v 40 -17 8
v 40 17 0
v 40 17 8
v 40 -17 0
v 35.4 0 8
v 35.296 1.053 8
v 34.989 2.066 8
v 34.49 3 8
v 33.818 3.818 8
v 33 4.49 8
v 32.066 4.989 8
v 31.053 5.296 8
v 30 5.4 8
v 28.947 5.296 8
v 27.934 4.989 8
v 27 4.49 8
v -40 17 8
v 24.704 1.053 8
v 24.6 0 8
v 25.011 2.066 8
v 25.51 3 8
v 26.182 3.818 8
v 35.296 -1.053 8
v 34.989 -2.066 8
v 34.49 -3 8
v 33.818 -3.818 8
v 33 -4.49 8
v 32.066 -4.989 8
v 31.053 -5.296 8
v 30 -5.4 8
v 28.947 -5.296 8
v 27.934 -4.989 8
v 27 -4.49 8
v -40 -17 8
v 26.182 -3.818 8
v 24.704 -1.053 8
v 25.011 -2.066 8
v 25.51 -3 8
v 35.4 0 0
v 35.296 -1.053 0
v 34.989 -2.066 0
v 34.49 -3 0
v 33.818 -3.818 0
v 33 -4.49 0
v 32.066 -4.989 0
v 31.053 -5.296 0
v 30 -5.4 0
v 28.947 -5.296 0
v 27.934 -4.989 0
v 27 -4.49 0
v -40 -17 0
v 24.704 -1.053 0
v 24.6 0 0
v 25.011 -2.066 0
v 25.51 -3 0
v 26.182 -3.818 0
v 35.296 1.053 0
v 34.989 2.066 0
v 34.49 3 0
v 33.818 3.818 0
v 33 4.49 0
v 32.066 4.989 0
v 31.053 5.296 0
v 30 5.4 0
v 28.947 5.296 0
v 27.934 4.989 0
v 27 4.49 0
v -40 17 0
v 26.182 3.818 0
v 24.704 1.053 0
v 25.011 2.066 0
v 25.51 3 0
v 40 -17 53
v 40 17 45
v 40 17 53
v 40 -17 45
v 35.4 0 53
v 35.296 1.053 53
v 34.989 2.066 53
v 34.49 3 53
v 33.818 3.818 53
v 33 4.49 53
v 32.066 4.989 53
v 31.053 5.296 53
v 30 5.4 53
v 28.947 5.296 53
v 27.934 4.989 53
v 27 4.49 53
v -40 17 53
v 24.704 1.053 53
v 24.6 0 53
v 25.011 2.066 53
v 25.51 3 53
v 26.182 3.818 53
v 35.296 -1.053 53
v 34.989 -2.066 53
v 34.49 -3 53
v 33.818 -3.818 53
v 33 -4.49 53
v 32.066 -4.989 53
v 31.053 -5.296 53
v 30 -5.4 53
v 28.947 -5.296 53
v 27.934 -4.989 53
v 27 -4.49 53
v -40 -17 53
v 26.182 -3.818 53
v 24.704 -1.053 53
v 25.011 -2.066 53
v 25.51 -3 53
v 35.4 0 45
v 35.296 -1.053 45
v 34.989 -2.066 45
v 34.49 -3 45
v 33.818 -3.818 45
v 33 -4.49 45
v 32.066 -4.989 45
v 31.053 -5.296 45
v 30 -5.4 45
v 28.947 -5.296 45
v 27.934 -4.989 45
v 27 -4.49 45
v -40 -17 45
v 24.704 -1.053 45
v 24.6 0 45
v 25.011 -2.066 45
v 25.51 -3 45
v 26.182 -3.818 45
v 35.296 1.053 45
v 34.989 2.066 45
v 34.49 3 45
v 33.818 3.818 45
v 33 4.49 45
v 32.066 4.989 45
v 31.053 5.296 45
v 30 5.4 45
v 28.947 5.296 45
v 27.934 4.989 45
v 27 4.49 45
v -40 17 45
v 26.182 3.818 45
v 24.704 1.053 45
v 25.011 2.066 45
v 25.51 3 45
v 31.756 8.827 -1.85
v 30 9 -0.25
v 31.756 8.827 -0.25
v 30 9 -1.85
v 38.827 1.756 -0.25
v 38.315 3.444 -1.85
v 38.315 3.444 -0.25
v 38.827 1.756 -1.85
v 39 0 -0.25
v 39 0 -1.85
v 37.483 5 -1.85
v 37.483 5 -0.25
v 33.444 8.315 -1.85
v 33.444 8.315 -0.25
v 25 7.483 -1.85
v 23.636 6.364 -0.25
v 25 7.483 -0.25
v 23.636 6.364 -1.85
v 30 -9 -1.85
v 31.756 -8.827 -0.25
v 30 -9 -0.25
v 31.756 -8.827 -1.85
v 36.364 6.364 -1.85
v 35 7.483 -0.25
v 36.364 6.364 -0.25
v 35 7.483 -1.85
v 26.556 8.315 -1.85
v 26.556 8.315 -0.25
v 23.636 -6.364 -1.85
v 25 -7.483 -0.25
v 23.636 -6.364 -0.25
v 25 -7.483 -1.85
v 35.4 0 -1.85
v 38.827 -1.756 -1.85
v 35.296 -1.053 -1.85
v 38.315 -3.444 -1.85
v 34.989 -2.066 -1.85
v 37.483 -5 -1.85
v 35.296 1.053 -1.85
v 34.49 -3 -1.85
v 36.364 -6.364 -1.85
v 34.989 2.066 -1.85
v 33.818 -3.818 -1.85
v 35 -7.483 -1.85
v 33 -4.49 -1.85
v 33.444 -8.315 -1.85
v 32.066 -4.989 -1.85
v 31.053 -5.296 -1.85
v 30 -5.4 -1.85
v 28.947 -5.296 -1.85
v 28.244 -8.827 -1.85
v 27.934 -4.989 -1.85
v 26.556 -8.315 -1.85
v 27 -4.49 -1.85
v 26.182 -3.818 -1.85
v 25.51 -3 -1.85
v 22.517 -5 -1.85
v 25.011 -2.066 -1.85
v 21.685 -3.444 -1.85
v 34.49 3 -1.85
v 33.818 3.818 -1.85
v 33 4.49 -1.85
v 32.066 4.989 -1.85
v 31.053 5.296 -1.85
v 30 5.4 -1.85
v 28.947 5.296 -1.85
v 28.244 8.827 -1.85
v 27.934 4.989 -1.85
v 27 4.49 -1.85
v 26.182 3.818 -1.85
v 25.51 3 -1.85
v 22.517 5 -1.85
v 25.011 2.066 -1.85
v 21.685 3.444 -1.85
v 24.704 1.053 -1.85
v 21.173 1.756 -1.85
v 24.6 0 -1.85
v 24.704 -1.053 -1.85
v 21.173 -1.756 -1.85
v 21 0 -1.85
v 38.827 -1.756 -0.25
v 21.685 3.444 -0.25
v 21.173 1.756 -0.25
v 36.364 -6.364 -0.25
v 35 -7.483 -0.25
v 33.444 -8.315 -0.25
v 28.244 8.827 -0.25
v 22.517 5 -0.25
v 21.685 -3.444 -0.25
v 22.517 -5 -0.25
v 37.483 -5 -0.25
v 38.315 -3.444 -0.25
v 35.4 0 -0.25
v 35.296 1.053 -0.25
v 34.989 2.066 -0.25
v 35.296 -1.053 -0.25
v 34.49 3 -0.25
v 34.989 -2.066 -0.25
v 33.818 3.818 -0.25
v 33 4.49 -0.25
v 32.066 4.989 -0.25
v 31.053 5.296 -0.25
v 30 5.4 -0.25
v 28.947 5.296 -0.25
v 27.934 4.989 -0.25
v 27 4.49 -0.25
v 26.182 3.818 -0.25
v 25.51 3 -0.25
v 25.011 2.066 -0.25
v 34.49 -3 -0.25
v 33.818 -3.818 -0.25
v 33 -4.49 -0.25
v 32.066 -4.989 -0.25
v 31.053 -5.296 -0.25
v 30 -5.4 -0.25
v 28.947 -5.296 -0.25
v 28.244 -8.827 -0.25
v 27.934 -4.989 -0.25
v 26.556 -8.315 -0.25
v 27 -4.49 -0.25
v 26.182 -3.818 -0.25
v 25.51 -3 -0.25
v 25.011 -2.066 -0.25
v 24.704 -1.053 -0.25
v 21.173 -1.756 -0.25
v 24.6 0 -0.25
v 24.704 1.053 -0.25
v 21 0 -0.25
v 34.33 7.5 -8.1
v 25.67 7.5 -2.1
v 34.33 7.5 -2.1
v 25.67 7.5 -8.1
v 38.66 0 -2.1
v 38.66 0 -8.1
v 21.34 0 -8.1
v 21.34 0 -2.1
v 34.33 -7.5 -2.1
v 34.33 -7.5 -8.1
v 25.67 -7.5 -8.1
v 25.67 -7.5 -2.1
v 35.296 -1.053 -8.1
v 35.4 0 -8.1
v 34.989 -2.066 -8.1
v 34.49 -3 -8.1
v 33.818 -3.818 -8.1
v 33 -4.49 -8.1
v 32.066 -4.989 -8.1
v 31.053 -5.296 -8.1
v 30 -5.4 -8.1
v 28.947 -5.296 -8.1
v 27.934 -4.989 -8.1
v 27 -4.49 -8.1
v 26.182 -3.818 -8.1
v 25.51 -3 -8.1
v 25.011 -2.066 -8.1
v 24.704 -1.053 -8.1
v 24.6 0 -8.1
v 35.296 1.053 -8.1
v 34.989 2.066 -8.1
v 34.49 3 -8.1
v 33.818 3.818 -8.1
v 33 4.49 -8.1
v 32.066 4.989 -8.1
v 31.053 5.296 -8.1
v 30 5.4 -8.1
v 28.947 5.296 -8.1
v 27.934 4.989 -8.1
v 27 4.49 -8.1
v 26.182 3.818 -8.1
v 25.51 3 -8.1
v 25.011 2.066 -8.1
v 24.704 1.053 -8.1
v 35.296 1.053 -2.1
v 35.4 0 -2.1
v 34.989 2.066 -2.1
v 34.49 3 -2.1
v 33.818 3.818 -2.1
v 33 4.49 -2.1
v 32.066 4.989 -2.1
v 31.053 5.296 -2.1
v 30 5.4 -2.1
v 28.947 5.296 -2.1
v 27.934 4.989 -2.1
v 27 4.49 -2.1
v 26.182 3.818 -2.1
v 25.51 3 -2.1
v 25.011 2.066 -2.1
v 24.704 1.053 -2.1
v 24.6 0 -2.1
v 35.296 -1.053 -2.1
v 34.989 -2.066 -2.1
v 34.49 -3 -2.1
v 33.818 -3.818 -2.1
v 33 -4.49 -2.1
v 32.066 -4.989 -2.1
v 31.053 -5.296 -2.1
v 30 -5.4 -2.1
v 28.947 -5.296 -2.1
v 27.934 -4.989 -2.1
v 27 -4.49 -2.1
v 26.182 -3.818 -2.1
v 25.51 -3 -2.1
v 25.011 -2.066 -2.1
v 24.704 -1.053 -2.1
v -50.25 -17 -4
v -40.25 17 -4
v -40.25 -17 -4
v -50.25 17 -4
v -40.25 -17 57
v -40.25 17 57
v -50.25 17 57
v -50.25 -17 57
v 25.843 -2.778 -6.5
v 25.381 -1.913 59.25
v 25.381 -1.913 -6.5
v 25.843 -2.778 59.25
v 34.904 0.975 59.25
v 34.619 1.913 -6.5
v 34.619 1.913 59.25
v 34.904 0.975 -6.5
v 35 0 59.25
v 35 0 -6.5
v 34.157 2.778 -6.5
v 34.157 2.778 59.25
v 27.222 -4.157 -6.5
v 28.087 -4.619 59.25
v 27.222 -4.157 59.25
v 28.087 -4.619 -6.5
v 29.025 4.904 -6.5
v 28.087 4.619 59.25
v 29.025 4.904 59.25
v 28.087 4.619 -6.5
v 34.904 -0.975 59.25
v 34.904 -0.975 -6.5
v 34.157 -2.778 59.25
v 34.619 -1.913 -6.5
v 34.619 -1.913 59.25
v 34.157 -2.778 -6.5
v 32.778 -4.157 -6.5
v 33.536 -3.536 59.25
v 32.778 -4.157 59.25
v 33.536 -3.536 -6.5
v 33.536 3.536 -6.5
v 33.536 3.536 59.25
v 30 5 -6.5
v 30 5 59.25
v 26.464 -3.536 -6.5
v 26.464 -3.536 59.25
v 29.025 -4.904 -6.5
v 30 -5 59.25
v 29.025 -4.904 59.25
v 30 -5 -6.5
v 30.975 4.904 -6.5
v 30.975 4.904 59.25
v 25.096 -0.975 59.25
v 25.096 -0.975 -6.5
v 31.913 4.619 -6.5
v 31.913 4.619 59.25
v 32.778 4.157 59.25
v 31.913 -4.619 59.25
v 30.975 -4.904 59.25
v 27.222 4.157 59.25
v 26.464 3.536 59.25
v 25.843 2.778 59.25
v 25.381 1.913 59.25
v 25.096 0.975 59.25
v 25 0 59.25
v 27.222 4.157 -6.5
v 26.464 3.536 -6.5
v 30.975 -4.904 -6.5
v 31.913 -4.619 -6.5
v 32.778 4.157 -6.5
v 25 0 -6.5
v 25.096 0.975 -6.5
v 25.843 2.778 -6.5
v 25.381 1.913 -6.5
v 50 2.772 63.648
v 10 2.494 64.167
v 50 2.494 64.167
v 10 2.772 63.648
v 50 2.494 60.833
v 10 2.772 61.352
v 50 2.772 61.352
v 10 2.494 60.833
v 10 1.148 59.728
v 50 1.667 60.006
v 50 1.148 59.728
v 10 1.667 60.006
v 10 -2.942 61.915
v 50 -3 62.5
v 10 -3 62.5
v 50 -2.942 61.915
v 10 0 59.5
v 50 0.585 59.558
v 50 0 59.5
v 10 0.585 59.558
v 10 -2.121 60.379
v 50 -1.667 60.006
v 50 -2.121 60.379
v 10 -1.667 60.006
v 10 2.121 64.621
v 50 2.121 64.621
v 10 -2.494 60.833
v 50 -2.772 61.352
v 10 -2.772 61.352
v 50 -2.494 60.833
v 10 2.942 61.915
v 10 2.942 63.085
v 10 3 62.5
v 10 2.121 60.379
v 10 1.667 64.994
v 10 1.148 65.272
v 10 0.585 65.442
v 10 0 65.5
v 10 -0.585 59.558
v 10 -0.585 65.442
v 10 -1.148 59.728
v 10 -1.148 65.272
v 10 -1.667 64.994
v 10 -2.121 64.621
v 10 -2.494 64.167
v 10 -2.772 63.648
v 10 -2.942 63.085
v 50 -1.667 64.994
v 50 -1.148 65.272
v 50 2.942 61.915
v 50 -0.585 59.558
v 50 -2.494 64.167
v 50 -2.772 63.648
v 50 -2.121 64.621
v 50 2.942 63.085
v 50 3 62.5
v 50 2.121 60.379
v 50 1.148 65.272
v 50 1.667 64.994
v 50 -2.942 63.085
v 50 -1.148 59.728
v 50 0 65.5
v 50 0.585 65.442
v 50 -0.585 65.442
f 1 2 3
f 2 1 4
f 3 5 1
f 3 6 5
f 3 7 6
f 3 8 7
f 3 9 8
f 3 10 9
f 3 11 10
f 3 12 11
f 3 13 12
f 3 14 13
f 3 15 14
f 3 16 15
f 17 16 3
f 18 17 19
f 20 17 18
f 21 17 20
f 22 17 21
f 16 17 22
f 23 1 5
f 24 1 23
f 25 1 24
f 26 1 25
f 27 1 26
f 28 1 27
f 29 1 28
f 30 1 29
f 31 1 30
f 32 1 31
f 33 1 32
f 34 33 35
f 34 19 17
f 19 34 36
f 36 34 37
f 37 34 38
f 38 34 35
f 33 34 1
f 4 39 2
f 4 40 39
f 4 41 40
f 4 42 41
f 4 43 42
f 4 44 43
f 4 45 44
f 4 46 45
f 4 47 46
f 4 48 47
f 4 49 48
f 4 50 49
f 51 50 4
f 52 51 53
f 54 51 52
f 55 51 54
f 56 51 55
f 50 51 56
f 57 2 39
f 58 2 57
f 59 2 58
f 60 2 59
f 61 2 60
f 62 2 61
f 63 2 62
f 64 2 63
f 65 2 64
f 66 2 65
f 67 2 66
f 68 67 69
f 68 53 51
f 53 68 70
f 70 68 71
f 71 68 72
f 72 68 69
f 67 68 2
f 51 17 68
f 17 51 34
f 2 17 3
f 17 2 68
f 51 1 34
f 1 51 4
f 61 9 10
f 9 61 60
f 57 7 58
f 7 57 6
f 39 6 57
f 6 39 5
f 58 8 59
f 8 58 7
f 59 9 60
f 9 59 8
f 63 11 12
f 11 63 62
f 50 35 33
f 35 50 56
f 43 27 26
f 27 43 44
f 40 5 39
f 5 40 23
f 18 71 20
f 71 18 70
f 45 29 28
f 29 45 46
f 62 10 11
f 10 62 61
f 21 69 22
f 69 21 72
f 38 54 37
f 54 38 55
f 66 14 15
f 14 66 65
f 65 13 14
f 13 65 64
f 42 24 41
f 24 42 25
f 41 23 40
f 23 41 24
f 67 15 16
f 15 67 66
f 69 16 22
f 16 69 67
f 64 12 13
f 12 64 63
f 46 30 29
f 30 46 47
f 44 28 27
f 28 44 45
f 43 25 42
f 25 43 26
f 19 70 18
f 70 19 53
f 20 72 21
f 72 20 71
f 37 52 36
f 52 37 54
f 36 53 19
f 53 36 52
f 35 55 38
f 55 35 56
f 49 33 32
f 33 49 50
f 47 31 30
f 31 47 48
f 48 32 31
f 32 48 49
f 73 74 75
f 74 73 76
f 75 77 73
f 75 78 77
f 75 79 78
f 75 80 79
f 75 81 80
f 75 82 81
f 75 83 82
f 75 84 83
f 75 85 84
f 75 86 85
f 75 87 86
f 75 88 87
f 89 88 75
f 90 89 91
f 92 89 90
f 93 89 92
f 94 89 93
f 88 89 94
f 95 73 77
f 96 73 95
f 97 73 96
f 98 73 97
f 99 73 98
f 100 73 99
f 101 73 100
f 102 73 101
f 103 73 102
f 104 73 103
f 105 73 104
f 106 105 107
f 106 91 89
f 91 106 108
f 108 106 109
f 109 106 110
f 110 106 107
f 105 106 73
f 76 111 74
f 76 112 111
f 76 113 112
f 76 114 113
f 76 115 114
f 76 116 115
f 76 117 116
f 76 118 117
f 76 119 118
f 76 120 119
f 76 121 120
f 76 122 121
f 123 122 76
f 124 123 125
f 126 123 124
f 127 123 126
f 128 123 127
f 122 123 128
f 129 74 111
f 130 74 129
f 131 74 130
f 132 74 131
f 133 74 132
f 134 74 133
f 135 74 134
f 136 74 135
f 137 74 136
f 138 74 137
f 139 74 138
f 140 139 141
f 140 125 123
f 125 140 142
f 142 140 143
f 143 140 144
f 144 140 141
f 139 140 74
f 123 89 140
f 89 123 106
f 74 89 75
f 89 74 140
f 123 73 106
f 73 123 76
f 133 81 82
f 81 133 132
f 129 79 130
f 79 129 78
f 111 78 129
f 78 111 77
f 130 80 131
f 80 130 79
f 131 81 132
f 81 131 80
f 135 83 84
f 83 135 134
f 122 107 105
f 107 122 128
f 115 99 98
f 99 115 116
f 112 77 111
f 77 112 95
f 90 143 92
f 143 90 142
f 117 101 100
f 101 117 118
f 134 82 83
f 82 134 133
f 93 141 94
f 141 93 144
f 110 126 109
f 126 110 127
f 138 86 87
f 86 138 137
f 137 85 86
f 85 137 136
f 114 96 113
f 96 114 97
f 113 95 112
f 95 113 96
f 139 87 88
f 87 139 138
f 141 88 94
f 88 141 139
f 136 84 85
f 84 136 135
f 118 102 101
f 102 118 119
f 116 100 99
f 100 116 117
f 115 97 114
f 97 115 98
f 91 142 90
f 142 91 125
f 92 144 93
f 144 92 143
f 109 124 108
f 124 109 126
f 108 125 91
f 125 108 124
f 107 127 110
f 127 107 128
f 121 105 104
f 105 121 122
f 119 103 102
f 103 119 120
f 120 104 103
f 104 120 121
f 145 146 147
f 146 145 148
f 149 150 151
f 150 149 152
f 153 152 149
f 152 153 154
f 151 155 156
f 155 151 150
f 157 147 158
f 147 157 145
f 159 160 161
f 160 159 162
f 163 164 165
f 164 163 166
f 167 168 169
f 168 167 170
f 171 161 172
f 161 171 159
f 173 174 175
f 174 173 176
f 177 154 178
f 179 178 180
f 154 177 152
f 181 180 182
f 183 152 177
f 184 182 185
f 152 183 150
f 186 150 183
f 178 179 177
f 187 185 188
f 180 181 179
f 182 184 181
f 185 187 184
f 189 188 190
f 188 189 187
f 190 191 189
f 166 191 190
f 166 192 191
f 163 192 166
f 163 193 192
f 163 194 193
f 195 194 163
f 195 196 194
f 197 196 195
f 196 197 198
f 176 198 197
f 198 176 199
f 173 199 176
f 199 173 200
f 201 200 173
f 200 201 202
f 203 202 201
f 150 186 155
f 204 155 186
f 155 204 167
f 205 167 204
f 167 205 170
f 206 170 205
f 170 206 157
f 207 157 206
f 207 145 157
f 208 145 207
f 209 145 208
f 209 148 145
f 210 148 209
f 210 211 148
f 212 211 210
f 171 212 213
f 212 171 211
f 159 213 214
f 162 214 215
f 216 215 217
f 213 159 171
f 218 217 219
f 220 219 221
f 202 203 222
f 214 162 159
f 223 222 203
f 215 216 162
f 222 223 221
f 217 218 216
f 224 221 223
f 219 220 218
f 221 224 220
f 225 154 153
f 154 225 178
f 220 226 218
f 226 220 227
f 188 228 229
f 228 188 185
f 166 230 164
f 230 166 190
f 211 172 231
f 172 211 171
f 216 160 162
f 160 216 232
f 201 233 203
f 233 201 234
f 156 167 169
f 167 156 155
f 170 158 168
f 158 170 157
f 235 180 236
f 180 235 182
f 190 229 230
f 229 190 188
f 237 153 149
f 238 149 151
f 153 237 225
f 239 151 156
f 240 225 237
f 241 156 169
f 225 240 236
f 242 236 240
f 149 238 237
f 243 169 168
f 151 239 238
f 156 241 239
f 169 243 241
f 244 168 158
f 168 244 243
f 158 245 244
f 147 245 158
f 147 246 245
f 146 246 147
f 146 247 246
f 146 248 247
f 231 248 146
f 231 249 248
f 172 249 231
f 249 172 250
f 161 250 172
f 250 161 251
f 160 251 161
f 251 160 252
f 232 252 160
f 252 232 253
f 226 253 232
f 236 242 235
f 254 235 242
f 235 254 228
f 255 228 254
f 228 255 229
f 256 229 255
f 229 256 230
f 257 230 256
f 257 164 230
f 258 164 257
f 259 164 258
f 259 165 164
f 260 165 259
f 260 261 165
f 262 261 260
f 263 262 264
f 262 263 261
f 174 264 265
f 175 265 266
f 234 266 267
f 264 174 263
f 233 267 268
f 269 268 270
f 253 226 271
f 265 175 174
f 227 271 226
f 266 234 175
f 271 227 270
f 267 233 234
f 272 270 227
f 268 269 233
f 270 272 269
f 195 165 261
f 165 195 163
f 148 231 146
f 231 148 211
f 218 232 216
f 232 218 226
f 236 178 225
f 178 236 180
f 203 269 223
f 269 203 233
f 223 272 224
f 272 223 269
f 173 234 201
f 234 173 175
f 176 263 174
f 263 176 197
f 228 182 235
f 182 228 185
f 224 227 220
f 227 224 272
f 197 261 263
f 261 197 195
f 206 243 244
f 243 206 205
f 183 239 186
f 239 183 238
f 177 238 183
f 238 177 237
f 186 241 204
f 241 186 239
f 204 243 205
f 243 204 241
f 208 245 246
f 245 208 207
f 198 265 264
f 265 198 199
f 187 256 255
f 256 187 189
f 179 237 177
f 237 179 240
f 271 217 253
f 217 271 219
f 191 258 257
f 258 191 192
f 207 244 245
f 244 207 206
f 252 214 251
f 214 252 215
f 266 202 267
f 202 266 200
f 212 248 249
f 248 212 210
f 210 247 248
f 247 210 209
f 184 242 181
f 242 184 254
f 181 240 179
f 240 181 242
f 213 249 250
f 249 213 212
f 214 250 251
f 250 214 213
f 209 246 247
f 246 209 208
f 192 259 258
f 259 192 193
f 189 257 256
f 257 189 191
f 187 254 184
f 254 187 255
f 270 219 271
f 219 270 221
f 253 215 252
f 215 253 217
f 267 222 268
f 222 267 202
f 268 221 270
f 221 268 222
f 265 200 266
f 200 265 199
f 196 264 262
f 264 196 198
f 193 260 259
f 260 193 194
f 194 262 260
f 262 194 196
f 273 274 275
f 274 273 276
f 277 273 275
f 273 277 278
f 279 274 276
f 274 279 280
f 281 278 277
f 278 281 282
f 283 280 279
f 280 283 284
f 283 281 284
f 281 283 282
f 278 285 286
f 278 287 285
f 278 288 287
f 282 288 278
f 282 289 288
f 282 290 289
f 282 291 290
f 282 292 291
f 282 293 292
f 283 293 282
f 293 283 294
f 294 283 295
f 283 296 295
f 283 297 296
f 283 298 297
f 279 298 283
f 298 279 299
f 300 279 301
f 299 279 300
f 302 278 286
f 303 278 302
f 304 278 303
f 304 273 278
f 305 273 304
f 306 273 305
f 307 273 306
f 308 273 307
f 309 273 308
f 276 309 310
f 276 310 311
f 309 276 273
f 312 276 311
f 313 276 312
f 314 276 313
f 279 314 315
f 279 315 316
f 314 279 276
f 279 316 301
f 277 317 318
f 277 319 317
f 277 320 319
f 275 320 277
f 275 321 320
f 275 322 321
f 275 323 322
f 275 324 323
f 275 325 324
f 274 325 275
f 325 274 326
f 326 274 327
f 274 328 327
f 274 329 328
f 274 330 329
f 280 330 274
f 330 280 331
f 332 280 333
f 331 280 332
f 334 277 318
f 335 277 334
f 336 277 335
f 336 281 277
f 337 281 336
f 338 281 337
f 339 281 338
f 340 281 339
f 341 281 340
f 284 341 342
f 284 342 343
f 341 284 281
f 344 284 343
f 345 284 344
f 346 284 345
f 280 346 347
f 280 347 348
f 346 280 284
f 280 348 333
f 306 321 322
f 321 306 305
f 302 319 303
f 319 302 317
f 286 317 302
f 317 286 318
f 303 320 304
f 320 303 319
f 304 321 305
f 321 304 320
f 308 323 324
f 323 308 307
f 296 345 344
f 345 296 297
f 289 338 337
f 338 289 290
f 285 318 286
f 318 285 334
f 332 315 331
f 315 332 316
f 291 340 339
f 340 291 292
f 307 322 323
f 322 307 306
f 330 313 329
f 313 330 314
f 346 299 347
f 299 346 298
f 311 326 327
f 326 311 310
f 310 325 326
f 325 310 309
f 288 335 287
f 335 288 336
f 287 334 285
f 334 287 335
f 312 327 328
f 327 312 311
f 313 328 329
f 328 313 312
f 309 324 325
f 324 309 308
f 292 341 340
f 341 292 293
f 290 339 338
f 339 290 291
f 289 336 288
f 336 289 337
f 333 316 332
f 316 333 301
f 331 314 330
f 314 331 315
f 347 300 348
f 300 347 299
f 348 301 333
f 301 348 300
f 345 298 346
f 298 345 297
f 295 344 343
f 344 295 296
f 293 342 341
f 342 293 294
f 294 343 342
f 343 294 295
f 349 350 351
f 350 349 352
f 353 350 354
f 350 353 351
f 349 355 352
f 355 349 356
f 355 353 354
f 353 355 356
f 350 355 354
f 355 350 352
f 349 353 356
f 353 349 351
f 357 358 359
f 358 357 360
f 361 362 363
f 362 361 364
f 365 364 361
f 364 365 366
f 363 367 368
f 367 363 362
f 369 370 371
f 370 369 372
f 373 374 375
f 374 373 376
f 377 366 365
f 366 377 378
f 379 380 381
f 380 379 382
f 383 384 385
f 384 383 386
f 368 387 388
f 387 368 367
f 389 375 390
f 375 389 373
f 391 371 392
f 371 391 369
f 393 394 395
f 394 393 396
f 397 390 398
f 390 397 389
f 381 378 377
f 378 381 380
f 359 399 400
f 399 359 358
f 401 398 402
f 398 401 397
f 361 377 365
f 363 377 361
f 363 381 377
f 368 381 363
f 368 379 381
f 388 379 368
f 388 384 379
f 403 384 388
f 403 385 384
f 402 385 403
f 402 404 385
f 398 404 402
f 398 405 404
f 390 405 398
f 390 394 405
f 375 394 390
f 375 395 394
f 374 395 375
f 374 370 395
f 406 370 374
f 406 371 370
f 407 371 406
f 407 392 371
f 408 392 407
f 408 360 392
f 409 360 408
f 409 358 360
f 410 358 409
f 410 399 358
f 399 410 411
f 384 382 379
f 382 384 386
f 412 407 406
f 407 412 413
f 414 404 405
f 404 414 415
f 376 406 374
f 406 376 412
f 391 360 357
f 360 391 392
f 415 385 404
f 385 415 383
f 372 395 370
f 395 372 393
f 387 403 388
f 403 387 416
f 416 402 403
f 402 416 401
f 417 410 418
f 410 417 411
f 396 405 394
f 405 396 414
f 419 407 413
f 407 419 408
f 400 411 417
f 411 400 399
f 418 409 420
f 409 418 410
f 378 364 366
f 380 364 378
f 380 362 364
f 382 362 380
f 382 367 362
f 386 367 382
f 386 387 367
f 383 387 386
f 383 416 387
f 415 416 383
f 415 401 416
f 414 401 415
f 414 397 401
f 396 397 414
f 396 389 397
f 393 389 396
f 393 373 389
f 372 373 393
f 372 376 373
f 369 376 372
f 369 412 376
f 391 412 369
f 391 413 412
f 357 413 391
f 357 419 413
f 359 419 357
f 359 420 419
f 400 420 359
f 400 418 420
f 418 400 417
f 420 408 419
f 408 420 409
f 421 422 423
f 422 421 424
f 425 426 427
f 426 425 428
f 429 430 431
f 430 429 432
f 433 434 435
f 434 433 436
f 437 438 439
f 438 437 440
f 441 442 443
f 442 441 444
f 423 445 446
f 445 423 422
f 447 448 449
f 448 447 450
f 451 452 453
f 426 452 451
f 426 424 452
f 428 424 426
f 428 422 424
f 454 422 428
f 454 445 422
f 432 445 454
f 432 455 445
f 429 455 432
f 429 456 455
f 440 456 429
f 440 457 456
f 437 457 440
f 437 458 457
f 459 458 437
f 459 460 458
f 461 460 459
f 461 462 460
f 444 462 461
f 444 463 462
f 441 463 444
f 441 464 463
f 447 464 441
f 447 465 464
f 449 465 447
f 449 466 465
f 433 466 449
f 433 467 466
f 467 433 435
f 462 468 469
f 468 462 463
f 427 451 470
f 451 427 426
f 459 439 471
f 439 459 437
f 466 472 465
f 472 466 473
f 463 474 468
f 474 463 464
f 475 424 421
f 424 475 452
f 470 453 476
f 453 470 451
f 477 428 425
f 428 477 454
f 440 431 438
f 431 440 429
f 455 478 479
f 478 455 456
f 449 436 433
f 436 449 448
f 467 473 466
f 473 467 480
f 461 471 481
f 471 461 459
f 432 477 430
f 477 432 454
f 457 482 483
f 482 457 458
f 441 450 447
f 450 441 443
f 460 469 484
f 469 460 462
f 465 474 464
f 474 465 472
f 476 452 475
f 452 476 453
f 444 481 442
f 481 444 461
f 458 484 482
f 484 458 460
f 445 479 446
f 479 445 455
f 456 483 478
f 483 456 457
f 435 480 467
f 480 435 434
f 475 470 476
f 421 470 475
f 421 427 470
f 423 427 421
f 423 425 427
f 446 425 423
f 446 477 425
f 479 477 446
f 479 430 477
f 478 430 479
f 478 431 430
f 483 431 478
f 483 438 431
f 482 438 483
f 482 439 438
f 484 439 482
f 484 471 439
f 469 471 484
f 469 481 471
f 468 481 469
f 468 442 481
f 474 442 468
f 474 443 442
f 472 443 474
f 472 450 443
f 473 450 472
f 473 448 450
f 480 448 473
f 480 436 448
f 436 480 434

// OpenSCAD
$fn = 32;

// ------------------------------------------------------------------------
// C clamp: throat 45 mm, screw d10
// Every part is its own module, assembly() places every instance.
// ------------------------------------------------------------------------

// --- part 1 ---
module clamp_arm() {
  difference() {
    translate([-40, -17, 0]) cube([80, 34, 8]);
    translate([30, 0, -1]) cylinder(h = 10, d = 10.8);
  }
}

// --- part 2 ---
module clamp_spine() {
  difference() {
    translate([-30.5, -17, 0]) cube([61, 34, 10]);
  }
}

// --- part 3 ---
module clamp_screw() {
  translate([0, 0, -32.875]) cylinder(h = 65.75, d = 10);
}

// --- part 4 ---
module clamp_washer() {
  difference() {
      translate([0, 0, 0]) cylinder(h = 1.6, d = 18);
      translate([0, 0, -1]) cylinder(h = 3.6, d = 10.8);
    }
}

// --- part 5 ---
module clamp_nut() {
  difference() {
    linear_extrude(height = 6) polygon(points = [[8.66, 0], [4.33, 7.5], [-4.33, 7.5], [-8.66, 0], [-4.33, -7.5], [4.33, -7.5]]);
    translate([0, 0, -1]) cylinder(h = 8, d = 10.8);
  }
}

// --- part 6 ---
module tommy_bar() {
  translate([0, 0, -20]) cylinder(h = 40, d = 6);
}

// --- assembly ---
module assembly() {
  color([0.80, 0.24, 0.20]) translate([0, 0, 0]) rotate([0, 0, 0]) clamp_arm();
  color([0.20, 0.45, 0.75]) translate([0, 0, 45]) rotate([0, 0, 0]) clamp_arm();
  color([0.25, 0.62, 0.32]) translate([-50.25, 0, 26.5]) rotate([0, 90, 0]) clamp_spine();
  color([0.92, 0.70, 0.18]) translate([30, 0, 26.375]) rotate([0, 0, 0]) clamp_screw();
  color([0.58, 0.35, 0.70]) translate([30, 0, -1.85]) rotate([0, 0, 0]) clamp_washer();
  color([0.16, 0.66, 0.66]) translate([30, 0, -8.1]) rotate([0, 0, 0]) clamp_nut();
  color([0.85, 0.48, 0.18]) translate([30, 0, 62.5]) rotate([0, 90, 0]) tommy_bar();
}

assembly();
